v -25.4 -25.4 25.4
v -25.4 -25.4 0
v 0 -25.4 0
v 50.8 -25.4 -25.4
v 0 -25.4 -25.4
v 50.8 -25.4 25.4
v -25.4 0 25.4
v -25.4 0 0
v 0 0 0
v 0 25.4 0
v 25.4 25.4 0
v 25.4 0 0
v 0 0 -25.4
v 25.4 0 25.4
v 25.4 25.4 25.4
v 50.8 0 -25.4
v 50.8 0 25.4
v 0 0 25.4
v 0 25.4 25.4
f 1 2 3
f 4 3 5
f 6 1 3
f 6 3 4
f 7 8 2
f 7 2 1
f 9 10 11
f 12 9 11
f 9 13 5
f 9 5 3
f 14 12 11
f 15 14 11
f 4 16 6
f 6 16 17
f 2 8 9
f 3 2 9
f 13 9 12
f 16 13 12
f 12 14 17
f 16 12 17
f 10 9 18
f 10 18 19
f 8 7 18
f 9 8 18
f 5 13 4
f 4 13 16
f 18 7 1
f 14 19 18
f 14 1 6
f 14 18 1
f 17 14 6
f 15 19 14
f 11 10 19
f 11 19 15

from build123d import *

# Parameters (mm, degrees)
F0_W     = 25.4
F0_H     = 25.4
F1_DEPTH = 25.4
F2_W     = 25.4
F2_H     = 25.4
F3_DEPTH = 25.4


with BuildPart() as f1:
    # F0 (on Front) → F1 (new body)
    with BuildSketch(Plane.XZ):
        with Locations((12.7, 12.7)):
            Rectangle(F0_W, F0_H)
        with Locations((-12.7, 12.7)):
            Rectangle(F0_W, F0_H)
        with Locations((12.7, -12.7)):
            Rectangle(F0_W, F0_H)
        with Locations((38.1, 12.7)):
            Rectangle(F0_W, F0_H)
        with Locations((38.1, -12.7)):
            Rectangle(F0_W, F0_H)
    extrude(amount=F1_DEPTH)

    # F2 (on Top) → F3 (join)
    with BuildSketch(Plane.XY):
        with Locations((12.7, 12.7)):
            Rectangle(F2_W, F2_H)
    extrude(amount=F3_DEPTH)


solid = f1.part
